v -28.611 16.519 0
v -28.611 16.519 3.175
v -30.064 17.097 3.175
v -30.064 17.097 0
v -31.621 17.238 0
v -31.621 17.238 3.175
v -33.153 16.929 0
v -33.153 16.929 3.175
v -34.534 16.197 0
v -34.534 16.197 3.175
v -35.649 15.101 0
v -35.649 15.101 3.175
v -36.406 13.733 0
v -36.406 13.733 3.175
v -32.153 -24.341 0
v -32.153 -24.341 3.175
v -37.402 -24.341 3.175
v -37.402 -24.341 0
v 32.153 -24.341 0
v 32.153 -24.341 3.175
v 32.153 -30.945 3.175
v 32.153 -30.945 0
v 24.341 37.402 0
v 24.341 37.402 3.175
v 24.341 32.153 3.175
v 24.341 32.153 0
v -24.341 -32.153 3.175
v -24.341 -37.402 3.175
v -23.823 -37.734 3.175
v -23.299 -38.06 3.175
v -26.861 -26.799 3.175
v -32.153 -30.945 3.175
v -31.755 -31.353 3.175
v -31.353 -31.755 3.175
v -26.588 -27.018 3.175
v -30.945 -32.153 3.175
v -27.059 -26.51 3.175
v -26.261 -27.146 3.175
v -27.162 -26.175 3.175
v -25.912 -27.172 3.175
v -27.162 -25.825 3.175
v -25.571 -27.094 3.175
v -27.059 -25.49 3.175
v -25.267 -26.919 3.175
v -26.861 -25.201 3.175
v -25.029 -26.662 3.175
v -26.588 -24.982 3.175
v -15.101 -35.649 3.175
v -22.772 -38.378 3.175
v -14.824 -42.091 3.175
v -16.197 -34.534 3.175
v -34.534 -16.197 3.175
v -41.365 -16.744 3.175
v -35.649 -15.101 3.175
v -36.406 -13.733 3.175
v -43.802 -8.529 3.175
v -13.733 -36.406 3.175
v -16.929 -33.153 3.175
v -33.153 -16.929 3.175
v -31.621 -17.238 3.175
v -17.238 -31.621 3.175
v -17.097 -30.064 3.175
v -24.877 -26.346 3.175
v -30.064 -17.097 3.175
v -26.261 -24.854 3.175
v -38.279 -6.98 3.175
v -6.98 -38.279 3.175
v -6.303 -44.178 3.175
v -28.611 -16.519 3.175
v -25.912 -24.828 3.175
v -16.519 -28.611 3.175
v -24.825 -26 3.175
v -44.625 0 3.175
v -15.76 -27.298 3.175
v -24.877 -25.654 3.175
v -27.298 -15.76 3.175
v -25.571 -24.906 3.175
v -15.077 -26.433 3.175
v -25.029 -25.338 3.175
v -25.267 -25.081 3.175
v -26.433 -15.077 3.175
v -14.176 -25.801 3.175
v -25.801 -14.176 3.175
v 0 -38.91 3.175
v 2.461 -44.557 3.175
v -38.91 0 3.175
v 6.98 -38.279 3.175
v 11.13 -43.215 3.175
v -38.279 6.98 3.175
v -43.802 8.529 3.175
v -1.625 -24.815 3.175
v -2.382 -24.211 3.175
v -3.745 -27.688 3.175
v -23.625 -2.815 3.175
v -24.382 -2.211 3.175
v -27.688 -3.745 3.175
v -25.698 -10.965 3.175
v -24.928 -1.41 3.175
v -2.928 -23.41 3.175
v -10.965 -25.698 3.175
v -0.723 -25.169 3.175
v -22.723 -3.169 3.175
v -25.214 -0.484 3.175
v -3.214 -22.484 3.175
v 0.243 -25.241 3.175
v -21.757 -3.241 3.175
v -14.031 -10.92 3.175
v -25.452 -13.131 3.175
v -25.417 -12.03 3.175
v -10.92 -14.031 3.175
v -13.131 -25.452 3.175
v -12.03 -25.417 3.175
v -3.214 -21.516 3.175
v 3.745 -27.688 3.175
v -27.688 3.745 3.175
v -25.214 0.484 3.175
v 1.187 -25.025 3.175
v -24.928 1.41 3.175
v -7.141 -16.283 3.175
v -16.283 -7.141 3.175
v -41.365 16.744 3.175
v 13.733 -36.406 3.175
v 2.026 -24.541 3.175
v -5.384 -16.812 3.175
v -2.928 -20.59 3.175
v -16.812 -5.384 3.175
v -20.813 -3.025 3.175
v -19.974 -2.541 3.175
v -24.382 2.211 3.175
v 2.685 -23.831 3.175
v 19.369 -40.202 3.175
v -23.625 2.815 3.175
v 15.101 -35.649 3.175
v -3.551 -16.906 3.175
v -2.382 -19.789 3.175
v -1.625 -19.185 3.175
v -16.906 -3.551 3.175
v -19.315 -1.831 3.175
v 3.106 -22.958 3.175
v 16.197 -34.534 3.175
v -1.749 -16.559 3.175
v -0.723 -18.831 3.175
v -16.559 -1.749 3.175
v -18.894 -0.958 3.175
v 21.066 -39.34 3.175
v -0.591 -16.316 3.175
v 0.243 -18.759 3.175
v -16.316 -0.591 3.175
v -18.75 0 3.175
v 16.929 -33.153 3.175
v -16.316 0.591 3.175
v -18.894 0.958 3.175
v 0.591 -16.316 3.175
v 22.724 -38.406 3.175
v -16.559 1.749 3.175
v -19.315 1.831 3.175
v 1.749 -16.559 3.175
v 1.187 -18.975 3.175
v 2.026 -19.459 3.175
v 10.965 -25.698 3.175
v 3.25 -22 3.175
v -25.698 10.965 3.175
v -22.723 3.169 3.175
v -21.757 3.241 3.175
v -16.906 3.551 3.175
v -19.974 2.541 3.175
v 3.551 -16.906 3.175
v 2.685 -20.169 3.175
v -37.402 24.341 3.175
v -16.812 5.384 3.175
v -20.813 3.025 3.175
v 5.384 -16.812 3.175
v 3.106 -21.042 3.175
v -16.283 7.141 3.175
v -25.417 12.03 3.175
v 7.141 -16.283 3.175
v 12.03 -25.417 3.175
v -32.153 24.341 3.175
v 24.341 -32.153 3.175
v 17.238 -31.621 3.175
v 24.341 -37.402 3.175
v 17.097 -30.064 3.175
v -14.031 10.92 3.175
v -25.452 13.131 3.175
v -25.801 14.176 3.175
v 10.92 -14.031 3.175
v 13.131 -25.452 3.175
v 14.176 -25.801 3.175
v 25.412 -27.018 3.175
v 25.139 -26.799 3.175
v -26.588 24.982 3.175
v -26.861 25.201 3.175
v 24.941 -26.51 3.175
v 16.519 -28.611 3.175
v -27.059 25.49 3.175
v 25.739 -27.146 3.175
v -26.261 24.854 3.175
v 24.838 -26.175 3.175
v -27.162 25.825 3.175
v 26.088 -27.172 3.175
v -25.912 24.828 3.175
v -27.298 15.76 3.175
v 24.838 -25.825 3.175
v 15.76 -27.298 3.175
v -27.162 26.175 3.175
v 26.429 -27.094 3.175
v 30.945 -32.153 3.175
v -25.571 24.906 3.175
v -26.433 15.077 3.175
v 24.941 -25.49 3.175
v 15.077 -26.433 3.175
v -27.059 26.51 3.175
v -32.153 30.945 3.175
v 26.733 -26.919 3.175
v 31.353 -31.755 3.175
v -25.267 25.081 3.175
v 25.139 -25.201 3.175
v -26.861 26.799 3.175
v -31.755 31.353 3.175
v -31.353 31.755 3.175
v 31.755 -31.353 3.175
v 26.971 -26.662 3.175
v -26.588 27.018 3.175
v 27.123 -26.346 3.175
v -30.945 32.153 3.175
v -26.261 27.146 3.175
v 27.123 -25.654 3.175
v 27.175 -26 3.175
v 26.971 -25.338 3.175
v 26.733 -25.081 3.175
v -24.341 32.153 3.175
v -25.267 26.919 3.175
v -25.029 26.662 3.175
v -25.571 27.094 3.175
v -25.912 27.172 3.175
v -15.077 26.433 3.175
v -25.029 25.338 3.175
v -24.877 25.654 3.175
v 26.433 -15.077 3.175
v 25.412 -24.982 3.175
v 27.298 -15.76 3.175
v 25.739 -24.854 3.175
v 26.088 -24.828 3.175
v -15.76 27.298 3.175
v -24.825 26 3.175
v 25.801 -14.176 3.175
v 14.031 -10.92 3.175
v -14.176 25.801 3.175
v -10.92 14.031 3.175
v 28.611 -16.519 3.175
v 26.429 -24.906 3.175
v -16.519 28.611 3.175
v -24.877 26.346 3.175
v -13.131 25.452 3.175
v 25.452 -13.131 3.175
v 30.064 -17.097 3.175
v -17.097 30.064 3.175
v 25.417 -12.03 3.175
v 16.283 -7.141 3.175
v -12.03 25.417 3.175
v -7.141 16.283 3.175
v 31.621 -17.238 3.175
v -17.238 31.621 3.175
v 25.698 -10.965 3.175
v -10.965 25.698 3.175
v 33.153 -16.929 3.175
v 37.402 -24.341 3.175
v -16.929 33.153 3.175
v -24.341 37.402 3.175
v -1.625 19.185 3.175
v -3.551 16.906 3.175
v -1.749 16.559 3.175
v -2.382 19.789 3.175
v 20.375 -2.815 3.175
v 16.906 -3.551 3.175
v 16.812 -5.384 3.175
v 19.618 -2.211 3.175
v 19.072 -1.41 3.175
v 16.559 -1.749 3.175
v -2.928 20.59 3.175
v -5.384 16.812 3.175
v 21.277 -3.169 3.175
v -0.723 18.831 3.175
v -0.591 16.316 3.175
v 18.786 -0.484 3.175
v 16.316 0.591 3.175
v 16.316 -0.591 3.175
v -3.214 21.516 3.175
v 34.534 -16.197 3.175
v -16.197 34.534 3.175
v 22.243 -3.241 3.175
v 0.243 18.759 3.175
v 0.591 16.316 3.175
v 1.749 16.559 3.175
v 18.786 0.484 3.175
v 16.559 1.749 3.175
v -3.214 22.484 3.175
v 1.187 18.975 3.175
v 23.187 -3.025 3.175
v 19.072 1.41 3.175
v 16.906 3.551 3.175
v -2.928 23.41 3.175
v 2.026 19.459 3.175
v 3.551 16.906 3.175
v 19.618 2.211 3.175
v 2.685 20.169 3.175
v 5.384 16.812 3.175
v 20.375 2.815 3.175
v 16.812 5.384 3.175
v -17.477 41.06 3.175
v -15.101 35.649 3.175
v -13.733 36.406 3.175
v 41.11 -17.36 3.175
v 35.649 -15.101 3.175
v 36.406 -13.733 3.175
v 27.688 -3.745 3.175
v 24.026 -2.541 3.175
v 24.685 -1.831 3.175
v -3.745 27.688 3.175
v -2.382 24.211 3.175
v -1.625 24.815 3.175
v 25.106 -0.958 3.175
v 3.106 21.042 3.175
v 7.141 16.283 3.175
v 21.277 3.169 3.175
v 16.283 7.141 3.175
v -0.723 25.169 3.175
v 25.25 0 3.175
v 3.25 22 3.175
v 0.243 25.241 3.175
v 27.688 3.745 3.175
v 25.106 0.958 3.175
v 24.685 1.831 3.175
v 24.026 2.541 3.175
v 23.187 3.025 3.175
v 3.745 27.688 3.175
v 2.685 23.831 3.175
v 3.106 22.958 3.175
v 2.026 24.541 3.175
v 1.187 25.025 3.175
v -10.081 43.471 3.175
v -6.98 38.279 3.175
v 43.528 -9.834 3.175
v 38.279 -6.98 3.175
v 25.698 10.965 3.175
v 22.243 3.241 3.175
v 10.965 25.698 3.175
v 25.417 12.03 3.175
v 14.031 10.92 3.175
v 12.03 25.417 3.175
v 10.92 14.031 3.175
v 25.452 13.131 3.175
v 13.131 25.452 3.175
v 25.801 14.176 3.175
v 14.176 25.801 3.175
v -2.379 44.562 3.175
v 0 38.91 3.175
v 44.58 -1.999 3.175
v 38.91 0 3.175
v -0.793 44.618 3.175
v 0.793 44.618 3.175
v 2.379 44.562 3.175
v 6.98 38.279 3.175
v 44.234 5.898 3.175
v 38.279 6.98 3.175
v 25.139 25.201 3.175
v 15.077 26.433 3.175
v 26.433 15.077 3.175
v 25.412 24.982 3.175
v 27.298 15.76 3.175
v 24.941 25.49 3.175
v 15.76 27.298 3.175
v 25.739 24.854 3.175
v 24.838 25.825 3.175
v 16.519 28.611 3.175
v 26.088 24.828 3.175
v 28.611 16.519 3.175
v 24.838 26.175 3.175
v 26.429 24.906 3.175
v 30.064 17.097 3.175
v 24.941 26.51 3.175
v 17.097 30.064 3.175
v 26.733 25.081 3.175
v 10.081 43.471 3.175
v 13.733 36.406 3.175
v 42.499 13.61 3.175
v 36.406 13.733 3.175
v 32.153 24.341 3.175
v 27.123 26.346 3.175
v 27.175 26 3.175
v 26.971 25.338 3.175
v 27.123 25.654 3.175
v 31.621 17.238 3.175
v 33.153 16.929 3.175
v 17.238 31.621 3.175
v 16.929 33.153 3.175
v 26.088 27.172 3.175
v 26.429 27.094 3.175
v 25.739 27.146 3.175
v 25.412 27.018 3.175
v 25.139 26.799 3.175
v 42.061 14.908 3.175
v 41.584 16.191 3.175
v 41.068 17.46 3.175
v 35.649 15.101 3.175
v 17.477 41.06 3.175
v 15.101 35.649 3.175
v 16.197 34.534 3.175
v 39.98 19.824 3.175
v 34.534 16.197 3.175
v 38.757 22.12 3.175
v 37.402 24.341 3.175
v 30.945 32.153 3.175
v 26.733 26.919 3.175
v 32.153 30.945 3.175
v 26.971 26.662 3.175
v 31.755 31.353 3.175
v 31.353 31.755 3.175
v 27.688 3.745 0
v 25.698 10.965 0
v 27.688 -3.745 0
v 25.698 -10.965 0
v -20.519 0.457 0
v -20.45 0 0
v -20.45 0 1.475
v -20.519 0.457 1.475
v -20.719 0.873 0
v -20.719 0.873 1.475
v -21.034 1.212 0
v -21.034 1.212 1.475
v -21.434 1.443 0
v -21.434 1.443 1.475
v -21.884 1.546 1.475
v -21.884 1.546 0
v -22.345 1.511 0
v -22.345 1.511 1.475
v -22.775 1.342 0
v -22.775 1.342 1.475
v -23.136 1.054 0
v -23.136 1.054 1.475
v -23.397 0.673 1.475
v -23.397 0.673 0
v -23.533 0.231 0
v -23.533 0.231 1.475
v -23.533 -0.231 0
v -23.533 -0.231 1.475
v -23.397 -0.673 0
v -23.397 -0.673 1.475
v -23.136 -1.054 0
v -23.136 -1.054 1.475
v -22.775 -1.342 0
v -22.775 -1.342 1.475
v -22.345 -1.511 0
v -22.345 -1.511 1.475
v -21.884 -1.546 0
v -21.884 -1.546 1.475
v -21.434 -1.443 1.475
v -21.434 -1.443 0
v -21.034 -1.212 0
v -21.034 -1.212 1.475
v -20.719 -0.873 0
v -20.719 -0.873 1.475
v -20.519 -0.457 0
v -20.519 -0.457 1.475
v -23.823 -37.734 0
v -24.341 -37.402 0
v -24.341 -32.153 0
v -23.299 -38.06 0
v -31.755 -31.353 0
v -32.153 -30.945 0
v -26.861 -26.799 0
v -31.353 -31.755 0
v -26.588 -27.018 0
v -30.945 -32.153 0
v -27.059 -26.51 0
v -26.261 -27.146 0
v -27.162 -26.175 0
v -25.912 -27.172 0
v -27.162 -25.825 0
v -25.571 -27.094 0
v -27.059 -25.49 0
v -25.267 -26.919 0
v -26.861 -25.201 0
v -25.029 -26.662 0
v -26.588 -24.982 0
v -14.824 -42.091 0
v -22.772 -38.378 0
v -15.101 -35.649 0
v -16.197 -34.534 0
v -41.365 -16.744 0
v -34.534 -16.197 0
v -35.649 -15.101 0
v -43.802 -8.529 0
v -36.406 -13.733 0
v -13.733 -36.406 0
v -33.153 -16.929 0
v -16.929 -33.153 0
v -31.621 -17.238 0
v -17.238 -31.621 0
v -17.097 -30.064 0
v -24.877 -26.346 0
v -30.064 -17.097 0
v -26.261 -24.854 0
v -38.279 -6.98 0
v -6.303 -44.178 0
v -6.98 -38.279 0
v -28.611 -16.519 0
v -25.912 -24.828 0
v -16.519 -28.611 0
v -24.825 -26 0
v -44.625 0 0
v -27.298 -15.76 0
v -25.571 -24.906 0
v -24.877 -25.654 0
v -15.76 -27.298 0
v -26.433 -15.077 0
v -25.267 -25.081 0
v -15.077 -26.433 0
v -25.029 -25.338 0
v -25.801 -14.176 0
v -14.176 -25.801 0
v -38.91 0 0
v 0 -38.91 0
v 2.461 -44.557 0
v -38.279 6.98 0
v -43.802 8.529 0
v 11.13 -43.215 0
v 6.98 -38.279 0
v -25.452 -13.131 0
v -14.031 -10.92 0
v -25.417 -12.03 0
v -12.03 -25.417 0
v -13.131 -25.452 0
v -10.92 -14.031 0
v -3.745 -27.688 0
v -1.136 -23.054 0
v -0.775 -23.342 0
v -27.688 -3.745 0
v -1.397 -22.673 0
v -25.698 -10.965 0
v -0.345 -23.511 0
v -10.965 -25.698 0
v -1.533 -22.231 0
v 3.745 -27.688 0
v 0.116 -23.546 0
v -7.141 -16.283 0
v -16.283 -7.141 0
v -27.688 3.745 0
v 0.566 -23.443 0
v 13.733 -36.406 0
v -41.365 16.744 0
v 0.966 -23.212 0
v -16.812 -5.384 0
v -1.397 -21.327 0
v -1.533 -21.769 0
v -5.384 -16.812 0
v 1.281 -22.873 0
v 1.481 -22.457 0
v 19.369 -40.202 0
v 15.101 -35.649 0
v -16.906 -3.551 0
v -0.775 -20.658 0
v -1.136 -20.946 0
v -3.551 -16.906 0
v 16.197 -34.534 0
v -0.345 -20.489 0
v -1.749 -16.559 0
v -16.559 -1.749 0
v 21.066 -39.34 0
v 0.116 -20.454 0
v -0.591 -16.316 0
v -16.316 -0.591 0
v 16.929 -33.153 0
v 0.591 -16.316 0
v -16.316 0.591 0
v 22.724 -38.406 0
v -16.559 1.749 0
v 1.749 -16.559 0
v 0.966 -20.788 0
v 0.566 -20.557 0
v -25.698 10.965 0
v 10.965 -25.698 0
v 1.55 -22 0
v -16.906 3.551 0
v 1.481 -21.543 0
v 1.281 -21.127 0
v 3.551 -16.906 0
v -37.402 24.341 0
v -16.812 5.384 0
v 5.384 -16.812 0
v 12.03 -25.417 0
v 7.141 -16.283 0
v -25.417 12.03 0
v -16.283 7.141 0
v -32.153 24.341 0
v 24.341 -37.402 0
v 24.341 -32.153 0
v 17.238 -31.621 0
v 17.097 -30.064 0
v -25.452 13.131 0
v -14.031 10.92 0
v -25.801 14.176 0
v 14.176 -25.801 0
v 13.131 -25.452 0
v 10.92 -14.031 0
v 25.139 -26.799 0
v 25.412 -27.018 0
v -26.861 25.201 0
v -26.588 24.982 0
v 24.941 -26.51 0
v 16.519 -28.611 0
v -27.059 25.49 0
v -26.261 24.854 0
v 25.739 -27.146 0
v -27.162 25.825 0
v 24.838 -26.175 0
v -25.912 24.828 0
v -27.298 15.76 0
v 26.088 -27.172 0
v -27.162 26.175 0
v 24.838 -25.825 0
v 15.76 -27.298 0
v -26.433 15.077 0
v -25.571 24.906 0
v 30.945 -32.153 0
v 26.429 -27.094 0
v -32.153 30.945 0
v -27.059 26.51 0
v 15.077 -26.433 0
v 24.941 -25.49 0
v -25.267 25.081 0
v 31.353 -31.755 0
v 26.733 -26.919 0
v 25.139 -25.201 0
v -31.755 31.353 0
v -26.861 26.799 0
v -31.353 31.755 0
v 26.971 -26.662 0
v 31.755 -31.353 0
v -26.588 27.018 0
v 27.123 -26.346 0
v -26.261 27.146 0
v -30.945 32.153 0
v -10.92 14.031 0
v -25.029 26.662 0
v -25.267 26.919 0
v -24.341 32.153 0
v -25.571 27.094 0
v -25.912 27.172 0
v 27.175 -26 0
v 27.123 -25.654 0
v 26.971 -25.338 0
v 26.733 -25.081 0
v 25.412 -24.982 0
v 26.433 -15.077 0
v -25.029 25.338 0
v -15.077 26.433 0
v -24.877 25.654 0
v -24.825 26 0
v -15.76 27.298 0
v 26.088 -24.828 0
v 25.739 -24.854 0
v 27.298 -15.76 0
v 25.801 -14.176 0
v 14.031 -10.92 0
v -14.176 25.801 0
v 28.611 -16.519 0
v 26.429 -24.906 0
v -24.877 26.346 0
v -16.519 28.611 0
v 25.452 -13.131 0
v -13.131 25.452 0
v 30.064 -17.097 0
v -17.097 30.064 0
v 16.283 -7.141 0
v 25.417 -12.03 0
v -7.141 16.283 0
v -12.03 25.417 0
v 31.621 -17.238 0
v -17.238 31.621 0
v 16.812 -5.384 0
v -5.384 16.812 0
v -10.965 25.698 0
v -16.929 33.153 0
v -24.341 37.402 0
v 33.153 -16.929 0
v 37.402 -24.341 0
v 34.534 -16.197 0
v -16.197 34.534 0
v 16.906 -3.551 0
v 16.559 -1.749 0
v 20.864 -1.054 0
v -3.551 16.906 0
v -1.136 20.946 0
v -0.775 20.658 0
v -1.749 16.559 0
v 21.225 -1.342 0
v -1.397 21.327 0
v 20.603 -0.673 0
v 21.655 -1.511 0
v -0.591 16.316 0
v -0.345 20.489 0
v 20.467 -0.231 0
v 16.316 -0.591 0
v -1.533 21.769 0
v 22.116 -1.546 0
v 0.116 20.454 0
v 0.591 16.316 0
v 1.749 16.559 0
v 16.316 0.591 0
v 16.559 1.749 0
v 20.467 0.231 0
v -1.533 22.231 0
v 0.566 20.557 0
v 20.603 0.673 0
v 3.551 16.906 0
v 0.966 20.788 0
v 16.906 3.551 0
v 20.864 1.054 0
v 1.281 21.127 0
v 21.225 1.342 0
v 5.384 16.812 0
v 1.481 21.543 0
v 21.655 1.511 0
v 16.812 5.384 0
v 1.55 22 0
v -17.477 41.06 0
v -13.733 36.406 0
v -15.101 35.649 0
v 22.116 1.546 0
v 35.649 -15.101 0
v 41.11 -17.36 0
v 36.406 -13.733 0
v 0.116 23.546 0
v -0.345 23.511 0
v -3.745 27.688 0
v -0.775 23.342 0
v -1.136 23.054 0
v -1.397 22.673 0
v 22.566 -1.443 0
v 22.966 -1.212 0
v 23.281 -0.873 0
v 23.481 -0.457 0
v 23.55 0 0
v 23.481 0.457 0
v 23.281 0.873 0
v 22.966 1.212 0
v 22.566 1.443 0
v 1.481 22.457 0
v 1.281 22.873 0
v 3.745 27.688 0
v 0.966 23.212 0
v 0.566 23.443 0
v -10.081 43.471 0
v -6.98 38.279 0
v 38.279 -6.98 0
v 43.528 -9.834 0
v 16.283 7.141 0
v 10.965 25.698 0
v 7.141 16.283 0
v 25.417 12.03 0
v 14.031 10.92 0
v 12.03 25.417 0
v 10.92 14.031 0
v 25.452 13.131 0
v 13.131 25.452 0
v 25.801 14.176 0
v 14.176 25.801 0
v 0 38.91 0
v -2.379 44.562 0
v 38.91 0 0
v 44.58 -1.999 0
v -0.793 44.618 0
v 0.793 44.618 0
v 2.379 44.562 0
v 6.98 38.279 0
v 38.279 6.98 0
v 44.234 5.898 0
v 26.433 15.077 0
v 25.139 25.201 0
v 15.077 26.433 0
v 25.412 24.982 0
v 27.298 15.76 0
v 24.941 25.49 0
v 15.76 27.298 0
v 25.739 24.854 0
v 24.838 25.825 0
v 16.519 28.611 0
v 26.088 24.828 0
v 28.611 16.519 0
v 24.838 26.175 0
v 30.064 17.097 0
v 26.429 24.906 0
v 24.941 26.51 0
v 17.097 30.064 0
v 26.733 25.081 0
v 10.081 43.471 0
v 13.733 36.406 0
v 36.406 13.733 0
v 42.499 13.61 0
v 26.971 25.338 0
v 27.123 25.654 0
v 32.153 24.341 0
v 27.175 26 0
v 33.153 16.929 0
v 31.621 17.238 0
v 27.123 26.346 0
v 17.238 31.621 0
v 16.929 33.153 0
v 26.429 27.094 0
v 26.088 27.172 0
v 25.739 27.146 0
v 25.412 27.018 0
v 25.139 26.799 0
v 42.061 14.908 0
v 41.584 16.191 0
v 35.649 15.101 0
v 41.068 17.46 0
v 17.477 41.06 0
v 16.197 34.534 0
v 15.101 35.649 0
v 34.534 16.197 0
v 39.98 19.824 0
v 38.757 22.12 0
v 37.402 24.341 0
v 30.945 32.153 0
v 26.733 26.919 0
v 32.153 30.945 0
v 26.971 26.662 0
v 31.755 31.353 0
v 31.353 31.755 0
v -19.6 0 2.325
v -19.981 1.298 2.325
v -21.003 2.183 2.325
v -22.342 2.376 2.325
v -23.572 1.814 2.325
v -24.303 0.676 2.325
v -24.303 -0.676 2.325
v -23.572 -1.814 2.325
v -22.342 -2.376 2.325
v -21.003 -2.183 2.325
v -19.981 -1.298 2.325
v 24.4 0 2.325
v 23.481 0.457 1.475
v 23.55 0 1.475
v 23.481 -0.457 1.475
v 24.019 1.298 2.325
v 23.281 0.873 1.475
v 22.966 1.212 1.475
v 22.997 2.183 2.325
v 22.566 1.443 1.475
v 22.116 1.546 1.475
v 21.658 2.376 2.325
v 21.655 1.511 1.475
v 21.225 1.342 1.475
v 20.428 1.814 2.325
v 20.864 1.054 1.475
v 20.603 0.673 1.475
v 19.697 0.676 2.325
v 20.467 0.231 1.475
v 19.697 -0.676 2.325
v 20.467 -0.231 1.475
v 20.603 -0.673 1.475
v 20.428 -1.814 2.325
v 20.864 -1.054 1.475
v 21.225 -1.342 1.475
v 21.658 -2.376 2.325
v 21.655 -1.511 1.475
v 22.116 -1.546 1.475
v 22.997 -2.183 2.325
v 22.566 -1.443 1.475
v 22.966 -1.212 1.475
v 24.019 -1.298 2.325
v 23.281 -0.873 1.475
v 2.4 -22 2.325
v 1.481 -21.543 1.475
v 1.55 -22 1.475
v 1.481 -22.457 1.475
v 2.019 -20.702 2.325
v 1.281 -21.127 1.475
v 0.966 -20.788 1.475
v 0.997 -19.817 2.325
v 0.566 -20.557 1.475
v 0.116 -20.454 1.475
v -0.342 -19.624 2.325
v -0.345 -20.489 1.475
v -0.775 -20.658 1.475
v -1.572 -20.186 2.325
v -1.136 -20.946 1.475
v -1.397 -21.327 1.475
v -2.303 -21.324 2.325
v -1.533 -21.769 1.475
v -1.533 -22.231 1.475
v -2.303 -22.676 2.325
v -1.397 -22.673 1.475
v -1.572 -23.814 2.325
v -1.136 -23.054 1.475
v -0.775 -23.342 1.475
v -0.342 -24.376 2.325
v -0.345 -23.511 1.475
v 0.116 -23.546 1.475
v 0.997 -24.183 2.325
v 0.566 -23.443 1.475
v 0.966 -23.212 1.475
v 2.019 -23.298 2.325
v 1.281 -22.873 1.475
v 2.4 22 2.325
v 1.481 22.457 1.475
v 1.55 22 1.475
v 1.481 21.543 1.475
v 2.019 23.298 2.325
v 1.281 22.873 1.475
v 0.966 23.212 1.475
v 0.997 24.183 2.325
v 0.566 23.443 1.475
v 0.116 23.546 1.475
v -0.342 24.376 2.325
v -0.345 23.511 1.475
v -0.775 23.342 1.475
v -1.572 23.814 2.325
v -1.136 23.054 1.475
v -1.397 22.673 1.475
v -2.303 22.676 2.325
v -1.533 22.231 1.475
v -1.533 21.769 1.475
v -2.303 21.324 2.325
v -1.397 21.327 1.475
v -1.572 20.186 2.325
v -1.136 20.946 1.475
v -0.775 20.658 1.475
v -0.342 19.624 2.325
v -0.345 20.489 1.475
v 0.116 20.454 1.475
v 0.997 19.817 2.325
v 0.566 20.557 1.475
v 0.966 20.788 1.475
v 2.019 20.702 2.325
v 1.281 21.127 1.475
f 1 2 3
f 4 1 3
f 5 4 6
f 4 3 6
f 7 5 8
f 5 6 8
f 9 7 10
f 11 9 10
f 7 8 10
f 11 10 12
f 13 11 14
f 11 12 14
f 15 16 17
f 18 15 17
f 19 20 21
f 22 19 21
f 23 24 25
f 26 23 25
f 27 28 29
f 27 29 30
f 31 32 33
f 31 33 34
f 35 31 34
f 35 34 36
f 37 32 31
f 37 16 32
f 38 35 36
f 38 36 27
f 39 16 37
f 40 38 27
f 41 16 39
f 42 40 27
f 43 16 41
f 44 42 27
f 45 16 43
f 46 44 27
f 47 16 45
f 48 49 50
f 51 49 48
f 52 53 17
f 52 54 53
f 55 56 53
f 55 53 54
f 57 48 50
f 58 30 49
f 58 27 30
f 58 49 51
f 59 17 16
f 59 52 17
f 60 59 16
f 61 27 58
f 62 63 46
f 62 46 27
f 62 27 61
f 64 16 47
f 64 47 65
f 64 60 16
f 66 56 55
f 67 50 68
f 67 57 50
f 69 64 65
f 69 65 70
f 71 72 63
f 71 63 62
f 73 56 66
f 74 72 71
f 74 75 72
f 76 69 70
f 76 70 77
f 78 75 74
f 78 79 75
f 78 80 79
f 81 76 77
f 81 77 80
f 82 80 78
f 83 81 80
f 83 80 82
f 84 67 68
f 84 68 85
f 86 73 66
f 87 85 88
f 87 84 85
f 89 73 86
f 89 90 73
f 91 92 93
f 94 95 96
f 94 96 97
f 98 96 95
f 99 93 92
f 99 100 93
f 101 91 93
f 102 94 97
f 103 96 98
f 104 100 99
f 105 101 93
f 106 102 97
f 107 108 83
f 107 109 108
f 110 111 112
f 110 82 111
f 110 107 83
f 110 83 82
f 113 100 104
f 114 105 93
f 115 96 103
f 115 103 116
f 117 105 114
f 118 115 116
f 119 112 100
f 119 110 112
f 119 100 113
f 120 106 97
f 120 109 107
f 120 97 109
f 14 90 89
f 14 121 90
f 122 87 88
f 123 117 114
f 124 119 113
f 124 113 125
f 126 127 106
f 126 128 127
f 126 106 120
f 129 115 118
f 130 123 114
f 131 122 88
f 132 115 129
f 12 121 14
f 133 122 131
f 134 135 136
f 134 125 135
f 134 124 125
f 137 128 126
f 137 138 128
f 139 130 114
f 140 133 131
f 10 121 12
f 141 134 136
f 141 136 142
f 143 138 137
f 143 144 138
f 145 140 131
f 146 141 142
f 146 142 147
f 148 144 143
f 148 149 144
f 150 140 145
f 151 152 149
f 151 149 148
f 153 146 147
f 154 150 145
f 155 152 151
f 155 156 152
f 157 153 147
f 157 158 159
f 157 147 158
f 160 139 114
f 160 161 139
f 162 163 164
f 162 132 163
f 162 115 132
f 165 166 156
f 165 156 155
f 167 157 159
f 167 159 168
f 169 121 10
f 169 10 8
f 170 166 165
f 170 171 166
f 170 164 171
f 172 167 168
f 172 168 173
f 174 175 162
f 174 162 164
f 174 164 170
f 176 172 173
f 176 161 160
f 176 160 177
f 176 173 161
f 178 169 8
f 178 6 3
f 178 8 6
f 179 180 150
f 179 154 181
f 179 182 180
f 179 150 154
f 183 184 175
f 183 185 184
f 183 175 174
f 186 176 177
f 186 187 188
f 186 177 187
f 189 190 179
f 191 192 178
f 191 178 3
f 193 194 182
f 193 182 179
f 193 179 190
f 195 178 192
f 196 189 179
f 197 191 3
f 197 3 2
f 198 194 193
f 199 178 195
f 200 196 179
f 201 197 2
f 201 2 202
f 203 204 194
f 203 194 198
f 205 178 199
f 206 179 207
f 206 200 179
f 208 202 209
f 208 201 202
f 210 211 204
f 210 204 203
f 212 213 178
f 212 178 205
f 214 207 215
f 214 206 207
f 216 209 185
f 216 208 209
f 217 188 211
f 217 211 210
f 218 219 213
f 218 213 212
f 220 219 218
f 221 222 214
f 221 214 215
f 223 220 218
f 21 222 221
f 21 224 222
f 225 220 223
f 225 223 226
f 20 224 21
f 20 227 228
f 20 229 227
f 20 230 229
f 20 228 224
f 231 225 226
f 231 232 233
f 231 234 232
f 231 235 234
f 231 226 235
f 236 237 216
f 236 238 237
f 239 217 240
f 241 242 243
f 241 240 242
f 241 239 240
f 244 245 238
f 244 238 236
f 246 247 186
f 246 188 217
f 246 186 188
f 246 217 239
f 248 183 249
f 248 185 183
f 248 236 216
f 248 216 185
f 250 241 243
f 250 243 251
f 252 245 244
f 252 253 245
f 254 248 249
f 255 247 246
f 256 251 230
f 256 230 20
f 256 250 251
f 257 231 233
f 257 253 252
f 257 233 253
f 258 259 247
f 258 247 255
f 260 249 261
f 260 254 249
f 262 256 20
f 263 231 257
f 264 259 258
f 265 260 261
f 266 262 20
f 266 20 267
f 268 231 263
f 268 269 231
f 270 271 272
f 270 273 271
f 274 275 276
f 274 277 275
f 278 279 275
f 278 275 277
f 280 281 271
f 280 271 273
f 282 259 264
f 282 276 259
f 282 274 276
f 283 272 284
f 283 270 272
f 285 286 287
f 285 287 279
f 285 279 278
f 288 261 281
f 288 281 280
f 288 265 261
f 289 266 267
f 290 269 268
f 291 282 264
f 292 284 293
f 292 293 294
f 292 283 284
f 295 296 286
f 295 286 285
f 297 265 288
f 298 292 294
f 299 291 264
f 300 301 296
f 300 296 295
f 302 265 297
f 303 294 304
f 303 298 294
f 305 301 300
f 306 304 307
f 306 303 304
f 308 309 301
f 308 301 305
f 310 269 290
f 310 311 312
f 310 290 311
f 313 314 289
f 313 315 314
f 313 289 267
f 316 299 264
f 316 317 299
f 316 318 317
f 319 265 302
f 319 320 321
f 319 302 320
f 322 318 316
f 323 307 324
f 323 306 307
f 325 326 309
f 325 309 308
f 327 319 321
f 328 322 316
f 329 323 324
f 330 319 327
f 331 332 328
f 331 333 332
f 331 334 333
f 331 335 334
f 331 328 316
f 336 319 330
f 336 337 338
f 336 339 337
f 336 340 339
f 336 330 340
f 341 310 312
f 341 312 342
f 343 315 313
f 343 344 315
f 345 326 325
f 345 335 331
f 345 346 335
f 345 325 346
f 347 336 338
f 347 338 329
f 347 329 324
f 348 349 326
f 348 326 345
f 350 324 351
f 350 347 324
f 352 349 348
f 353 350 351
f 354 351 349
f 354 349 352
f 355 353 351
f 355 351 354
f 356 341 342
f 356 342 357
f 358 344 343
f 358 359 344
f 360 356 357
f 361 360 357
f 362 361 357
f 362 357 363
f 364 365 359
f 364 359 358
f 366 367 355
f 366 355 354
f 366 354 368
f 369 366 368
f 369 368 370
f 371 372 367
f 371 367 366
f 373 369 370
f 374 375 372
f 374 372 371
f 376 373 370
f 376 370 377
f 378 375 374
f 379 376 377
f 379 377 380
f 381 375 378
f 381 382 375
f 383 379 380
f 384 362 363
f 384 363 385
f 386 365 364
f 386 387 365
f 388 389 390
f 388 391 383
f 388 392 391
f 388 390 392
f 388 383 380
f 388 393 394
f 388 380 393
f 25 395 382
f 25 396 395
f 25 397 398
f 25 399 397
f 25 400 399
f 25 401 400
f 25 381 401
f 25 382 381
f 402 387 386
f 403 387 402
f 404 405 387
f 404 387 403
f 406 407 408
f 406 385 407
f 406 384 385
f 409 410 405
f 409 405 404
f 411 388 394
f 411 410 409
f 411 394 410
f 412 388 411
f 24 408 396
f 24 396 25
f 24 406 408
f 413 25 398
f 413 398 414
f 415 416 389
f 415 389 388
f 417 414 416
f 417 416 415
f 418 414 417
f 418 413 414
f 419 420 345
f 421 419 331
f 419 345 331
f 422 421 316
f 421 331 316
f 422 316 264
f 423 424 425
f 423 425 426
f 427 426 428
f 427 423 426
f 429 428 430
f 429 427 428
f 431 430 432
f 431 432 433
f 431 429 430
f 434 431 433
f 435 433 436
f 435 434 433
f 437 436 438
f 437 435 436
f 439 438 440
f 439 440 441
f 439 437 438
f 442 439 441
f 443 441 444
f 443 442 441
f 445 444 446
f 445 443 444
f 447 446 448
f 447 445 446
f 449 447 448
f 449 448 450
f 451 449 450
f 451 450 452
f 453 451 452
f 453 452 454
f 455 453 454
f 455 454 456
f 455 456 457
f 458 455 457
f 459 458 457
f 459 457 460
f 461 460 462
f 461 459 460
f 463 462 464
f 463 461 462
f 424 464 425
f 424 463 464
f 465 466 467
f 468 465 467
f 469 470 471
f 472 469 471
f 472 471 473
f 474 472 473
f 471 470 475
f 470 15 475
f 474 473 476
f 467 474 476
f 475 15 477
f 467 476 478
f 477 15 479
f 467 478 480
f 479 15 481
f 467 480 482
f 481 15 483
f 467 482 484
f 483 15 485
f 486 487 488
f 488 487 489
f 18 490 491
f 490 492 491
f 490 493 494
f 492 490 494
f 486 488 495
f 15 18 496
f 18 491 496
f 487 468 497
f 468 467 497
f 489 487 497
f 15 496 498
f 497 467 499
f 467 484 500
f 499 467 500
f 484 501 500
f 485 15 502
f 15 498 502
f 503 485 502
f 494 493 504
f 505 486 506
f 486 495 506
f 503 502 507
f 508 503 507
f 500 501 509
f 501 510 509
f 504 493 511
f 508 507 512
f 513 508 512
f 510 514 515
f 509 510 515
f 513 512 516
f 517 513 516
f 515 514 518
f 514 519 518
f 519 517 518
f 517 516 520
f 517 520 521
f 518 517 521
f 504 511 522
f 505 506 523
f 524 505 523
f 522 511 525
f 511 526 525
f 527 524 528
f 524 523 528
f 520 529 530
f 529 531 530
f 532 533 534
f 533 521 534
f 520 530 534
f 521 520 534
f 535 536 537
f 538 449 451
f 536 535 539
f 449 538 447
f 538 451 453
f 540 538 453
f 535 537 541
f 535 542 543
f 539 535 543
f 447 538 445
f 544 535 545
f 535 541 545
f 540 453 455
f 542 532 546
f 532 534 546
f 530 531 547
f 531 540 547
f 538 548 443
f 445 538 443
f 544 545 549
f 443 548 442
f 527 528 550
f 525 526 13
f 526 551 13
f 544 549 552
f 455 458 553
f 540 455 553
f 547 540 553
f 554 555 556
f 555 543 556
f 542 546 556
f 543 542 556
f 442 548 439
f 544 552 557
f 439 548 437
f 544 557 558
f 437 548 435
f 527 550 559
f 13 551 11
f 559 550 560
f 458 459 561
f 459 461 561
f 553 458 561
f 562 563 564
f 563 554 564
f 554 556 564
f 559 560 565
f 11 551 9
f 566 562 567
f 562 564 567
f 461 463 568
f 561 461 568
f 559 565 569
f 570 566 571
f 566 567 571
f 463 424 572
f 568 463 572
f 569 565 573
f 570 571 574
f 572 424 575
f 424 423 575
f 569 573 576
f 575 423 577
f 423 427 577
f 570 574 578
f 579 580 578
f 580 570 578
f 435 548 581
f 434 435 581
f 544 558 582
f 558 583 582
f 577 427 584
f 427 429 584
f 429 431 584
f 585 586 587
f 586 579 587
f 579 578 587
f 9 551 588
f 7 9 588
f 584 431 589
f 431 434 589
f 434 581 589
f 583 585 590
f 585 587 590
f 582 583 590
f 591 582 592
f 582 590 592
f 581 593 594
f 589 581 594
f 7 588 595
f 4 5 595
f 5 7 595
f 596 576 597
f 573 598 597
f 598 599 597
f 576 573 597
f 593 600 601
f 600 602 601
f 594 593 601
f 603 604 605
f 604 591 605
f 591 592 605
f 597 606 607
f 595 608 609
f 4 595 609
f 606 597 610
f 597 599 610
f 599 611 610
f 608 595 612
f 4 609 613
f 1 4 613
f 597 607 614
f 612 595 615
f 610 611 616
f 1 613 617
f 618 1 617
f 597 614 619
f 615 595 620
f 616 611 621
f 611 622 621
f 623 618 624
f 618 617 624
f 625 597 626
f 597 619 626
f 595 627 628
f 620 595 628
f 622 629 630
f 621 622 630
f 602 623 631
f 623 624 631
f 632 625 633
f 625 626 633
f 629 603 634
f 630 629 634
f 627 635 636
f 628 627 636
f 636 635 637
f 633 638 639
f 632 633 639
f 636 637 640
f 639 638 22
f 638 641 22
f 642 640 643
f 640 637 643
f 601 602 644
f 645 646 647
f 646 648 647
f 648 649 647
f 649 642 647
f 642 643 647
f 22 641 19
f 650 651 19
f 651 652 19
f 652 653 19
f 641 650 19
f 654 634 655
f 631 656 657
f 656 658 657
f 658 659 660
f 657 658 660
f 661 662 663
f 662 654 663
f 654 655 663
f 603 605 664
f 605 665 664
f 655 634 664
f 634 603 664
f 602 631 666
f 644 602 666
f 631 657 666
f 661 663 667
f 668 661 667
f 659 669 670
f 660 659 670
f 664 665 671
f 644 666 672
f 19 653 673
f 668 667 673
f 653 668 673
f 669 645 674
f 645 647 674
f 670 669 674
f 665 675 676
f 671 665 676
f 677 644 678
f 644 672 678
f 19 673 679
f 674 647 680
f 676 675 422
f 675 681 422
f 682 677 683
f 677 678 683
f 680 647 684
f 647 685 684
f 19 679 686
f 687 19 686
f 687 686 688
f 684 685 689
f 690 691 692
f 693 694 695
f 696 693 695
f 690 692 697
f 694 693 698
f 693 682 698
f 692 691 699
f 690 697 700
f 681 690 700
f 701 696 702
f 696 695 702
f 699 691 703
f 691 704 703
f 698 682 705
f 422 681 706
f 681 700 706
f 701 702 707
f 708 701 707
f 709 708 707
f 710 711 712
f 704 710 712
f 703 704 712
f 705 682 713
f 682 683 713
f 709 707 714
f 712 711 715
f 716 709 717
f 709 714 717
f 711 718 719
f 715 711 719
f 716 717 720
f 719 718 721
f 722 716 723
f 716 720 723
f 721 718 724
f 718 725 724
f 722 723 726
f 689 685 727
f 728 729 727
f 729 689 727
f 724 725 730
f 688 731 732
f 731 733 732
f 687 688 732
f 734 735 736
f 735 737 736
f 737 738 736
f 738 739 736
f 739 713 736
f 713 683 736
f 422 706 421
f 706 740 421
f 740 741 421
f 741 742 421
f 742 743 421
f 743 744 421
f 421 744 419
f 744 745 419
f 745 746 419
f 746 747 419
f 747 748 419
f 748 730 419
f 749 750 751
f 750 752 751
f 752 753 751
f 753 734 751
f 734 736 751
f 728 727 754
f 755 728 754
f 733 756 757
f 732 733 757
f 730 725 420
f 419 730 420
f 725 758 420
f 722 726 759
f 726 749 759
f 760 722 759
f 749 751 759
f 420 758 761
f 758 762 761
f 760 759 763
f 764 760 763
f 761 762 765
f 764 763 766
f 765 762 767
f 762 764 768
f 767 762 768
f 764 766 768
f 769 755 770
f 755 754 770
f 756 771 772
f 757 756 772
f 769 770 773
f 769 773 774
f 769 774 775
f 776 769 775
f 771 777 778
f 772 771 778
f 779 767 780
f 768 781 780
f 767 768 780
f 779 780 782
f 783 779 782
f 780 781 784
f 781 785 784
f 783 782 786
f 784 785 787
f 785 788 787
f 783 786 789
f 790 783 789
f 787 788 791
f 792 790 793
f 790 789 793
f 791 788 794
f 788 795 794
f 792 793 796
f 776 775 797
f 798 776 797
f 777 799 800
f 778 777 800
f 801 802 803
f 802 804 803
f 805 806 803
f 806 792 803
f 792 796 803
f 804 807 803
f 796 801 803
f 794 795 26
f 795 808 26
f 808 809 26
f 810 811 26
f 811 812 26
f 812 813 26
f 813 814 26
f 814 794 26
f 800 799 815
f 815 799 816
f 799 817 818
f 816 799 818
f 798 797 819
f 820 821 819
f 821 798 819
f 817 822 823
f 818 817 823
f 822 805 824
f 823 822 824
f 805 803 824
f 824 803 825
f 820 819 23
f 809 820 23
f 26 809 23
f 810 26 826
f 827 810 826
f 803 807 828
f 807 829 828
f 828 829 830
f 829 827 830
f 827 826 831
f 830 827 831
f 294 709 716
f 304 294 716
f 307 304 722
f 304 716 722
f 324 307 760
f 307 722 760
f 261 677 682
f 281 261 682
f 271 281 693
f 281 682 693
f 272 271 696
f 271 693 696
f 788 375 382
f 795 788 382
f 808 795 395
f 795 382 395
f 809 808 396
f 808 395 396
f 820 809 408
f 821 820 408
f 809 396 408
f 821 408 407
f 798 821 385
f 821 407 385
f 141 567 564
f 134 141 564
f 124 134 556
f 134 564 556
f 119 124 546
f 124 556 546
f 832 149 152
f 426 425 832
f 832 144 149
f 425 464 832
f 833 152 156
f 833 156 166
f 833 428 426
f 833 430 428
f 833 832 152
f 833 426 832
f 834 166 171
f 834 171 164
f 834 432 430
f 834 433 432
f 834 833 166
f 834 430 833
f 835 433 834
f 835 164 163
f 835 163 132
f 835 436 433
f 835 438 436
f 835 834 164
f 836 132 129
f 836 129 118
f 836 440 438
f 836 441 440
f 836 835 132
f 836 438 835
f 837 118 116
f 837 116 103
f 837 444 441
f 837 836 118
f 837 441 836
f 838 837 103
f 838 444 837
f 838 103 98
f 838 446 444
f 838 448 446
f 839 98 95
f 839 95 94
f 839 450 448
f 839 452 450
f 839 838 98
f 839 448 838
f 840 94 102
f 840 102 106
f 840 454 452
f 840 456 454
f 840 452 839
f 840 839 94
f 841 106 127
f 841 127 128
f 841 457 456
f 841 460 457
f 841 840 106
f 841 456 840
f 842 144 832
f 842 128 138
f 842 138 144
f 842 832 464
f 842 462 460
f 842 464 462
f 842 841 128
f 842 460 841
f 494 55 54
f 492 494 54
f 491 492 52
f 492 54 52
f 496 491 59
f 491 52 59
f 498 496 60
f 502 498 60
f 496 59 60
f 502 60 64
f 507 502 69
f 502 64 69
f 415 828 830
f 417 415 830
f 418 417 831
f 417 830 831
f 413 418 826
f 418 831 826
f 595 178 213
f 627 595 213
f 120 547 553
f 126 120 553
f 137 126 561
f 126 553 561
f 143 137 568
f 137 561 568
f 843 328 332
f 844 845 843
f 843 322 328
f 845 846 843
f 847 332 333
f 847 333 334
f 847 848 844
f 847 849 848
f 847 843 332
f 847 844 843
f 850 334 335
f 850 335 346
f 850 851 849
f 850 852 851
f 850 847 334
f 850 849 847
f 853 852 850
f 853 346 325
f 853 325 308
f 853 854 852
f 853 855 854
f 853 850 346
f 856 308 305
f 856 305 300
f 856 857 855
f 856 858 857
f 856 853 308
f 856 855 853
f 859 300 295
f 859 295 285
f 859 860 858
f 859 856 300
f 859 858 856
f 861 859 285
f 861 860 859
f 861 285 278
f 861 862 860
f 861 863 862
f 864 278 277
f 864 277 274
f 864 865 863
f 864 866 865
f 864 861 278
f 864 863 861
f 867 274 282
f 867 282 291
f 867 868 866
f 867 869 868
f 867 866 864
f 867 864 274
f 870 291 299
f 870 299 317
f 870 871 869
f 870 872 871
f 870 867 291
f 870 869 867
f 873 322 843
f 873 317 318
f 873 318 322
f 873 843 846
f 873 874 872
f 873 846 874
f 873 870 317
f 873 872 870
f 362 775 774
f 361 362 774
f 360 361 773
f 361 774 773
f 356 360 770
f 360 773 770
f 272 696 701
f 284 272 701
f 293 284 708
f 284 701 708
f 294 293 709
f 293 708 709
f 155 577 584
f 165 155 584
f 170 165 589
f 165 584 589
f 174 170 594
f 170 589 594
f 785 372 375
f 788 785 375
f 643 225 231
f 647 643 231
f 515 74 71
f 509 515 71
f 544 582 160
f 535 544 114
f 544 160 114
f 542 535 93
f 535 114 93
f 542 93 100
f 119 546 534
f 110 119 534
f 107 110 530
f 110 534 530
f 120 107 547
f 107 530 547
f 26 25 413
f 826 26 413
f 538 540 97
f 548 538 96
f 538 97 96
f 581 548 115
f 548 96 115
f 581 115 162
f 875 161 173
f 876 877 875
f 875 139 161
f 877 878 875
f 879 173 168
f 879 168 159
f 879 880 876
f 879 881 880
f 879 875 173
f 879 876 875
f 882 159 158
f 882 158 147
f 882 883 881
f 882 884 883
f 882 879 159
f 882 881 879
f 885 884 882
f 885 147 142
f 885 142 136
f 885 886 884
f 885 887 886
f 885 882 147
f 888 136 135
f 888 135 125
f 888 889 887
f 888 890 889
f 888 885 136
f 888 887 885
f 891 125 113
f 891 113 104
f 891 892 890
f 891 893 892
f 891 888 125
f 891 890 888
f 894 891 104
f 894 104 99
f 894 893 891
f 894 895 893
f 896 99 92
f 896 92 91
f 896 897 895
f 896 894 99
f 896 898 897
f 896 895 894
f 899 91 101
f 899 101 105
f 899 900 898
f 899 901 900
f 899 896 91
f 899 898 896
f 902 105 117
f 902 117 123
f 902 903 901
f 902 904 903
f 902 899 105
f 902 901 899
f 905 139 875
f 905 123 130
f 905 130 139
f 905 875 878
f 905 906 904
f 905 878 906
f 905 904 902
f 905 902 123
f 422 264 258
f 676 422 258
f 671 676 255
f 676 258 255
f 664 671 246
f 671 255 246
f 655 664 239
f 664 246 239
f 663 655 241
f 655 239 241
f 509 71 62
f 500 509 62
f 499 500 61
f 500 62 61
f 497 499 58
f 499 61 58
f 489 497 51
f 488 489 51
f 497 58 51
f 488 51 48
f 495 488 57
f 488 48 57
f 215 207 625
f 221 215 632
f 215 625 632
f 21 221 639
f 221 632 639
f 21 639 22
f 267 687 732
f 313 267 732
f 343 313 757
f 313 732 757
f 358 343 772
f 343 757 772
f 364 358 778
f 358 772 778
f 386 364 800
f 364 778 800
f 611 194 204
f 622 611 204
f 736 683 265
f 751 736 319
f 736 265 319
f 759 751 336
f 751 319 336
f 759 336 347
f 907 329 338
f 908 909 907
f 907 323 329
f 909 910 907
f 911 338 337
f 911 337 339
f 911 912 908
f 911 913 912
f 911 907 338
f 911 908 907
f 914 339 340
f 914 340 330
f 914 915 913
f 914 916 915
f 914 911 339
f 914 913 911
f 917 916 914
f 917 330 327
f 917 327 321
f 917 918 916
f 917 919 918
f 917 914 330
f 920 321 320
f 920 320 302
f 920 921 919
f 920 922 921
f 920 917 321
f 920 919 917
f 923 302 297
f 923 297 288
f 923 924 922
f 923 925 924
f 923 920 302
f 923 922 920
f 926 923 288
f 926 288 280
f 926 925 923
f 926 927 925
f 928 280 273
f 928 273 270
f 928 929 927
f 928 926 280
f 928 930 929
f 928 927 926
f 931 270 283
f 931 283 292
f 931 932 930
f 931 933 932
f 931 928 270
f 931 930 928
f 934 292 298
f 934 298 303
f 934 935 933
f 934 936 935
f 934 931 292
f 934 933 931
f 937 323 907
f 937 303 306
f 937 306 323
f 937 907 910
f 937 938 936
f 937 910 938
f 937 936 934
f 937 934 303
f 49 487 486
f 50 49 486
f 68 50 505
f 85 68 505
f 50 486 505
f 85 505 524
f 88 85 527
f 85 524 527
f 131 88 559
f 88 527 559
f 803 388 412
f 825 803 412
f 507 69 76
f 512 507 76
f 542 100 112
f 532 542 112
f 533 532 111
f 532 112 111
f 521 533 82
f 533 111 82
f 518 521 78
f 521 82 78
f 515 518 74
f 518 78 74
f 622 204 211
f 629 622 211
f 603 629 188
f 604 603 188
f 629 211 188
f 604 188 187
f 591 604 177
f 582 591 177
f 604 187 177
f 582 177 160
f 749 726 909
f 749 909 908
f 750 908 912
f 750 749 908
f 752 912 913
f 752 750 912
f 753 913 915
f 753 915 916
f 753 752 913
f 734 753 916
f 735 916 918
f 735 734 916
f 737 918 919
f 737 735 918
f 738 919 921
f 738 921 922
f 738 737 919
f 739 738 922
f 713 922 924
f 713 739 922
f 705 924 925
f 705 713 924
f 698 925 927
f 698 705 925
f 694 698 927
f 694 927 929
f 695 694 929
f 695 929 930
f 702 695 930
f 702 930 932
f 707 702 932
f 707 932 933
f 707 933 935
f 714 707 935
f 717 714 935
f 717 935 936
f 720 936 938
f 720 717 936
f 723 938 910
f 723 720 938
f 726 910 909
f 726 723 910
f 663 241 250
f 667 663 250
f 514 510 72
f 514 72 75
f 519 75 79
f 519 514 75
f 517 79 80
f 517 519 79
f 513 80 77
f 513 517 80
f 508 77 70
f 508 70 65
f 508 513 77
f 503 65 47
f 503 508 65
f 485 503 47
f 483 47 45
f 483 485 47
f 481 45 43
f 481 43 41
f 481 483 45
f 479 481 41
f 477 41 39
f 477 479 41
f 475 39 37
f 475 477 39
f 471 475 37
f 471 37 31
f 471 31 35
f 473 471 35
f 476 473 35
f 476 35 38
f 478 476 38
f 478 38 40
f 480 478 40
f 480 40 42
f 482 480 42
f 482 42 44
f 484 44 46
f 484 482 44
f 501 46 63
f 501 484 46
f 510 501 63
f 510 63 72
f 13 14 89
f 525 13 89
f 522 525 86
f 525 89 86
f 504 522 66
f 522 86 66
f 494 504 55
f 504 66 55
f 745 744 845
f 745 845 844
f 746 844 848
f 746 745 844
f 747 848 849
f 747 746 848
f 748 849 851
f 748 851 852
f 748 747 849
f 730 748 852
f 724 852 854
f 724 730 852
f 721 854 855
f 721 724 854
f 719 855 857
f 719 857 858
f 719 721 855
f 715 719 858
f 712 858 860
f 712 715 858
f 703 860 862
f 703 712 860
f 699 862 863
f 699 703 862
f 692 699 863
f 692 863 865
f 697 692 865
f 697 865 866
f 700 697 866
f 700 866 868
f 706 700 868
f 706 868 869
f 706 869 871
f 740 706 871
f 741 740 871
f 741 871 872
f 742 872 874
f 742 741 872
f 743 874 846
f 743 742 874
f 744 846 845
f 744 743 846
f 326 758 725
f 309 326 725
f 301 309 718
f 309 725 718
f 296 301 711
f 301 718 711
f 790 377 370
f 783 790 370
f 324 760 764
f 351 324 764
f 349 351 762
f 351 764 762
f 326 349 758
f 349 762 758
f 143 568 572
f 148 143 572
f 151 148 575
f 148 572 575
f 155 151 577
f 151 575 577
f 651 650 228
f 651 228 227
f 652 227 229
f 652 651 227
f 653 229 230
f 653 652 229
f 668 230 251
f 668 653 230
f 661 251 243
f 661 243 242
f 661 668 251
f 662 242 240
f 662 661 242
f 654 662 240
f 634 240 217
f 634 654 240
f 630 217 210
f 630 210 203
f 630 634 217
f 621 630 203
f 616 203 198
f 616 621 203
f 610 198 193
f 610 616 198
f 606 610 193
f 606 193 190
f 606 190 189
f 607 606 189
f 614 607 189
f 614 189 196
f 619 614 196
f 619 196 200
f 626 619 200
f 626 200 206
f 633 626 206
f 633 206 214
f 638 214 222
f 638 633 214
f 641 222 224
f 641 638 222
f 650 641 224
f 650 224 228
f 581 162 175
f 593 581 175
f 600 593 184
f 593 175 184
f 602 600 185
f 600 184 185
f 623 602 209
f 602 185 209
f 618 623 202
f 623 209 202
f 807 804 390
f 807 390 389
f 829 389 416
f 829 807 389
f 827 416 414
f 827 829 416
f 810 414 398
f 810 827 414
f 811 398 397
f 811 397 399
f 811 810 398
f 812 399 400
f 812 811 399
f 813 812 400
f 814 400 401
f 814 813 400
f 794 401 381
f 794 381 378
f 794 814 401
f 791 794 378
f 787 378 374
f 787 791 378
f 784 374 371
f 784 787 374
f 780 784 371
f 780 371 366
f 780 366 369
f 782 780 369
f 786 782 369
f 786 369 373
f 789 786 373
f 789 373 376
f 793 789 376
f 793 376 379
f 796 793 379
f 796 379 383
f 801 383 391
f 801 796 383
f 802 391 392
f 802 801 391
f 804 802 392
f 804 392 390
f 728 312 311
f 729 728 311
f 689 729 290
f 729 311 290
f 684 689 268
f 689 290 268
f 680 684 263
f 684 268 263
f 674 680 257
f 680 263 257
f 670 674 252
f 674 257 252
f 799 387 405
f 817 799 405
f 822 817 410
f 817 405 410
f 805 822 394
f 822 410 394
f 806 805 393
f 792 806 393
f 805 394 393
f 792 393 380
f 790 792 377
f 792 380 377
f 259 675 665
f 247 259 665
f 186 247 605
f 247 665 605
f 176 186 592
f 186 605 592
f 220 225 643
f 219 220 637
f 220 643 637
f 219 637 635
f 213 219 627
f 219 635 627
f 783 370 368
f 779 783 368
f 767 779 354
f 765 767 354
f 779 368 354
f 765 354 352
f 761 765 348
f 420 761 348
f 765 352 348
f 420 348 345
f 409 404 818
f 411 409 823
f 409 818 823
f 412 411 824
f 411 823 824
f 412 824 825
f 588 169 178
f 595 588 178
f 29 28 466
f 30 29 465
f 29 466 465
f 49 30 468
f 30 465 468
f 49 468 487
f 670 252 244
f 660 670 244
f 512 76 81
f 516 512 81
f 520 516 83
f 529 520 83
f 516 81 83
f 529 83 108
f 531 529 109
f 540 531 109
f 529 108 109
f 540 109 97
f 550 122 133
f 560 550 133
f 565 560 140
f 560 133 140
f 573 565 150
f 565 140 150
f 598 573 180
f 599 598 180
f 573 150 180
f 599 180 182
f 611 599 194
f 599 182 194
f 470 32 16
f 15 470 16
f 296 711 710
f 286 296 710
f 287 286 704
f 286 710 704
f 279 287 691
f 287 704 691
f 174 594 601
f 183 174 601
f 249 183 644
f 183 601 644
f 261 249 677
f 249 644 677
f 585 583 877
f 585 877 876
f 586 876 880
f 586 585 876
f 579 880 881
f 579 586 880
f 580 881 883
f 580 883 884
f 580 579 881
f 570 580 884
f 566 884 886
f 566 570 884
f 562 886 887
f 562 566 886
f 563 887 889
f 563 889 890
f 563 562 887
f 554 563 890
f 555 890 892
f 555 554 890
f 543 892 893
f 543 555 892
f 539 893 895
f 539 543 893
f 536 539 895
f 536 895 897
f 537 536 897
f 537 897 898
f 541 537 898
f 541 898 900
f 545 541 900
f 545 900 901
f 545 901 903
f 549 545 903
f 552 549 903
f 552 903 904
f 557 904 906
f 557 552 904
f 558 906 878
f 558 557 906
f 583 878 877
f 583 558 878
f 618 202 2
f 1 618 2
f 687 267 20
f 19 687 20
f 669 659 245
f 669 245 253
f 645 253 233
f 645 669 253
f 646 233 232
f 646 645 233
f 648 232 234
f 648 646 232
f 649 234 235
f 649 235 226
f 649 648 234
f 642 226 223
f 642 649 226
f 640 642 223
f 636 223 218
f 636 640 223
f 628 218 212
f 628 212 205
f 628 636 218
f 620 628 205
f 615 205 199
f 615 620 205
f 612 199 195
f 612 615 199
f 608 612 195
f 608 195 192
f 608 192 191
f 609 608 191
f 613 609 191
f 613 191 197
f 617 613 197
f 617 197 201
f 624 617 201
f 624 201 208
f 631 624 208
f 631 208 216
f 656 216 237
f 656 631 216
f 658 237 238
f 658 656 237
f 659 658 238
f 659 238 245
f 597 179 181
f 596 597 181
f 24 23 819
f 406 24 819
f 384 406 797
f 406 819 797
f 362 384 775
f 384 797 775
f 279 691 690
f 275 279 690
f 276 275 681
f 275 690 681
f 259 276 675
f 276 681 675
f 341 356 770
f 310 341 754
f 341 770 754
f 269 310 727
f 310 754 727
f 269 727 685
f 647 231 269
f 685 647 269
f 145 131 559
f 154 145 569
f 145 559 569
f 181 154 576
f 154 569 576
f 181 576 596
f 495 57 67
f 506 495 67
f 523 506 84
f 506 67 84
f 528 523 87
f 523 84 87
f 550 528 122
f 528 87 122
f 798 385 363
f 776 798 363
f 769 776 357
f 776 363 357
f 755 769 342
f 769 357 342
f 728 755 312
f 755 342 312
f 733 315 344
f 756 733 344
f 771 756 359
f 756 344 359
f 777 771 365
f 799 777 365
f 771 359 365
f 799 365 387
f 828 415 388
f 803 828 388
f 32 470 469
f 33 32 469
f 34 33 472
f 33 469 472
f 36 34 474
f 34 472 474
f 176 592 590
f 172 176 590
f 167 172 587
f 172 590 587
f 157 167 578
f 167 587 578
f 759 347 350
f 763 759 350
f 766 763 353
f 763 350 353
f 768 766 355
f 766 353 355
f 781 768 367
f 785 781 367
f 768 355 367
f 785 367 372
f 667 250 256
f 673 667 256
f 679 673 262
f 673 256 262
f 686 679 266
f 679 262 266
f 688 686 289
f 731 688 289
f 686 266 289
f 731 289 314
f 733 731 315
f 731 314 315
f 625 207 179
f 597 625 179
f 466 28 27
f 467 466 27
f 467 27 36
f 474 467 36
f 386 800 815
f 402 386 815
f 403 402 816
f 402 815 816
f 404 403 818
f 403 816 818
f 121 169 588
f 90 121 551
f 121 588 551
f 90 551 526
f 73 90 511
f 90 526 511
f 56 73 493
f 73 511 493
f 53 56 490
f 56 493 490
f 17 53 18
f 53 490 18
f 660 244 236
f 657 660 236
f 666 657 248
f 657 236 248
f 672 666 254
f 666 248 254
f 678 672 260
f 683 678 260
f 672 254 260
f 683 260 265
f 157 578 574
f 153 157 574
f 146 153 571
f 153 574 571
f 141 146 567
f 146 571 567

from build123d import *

# Parameters (mm, degrees)
SKETCH1_R           = 1.175
SKETCH1_R_2         = 1.55
BOSS_EXTRUDE1_DEPTH = 3.175
CUT_EXTRUDE2_DEPTH  = 64.189096172
CUT_EXTRUDE1_DEPTH  = 64.189096172
CIRPATTERN1_COUNT   = 4
CHAMFER1_SIZE       = 1.7


with BuildPart() as part:
    # Sketch1 → Boss-Extrude1 (new body)
    with BuildSketch(Plane.XY):
        with BuildLine():
            ThreePointArc((-28.274738921, -34.524335822), (-25.595848472, -36.554659976), (-22.771733351, -38.377581805))
            ThreePointArc((-22.771733351, -38.377581805), (-1.930585195, -44.583219554), (19.368987874, -40.202399602))
            ThreePointArc((19.368987874, -40.202399602), (22.3125, -38.646383644), (25.131805412, -36.875235345))
            ThreePointArc((25.131805412, -36.875235345), (42.197997698, -14.516184597), (42.498870951, 13.610165056))
            ThreePointArc((42.498870951, 13.610165056), (41.827558264, 15.551398481), (41.067627867, 17.459684027))
            ThreePointArc((41.067627867, 17.459684027), (25.603337609, 36.549414883), (2.379040875, 44.561539353))
            ThreePointArc((2.379040875, 44.561539353), (0, 44.625), (-2.379040875, 44.561539353))
            ThreePointArc((-2.379040875, 44.561539353), (-42.409403049, 13.886437917), (-28.274738921, -34.524335822))
        make_face()
        with Locations((-26, -26)):
            Circle(SKETCH1_R, mode=Mode.SUBTRACT)
        with Locations((0, -22)):
            Circle(SKETCH1_R_2, mode=Mode.SUBTRACT)
        with Locations((-22, 0)):
            Circle(SKETCH1_R_2, mode=Mode.SUBTRACT)
        with BuildLine():
            ThreePointArc((-7.14068763, 16.283088778), (-4.469980501, 16.914656425), (-1.748739828, 16.559123782))
            ThreePointArc((-1.748739828, 16.559123782), (0, 16.285), (1.748739828, 16.559123782))
            ThreePointArc((1.748739828, 16.559123782), (4.469980501, 16.914656425), (7.14068763, 16.283088778))
            ThreePointArc((7.14068763, 16.283088778), (12.572358569, 12.572358569), (16.283088778, 7.14068763))
            ThreePointArc((16.283088778, 7.14068763), (16.914656425, 4.469980501), (16.559123782, 1.748739828))
            ThreePointArc((16.559123782, 1.748739828), (16.285, 0), (16.559123782, -1.748739828))
            ThreePointArc((16.559123782, -1.748739828), (16.914656425, -4.469980501), (16.283088778, -7.14068763))
            ThreePointArc((16.283088778, -7.14068763), (12.572358569, -12.572358569), (7.14068763, -16.283088778))
            ThreePointArc((7.14068763, -16.283088778), (4.469980501, -16.914656425), (1.748739828, -16.559123782))
            ThreePointArc((1.748739828, -16.559123782), (0, -16.285), (-1.748739828, -16.559123782))
            ThreePointArc((-1.748739828, -16.559123782), (-4.469980501, -16.914656425), (-7.14068763, -16.283088778))
            ThreePointArc((-7.14068763, -16.283088778), (-12.572358569, -12.572358569), (-16.283088778, -7.14068763))
            ThreePointArc((-16.283088778, -7.14068763), (-16.914656425, -4.469980501), (-16.559123782, -1.748739828))
            ThreePointArc((-16.559123782, -1.748739828), (-16.285, 0), (-16.559123782, 1.748739828))
            ThreePointArc((-16.559123782, 1.748739828), (-16.914656425, 4.469980501), (-16.283088778, 7.14068763))
            ThreePointArc((-16.283088778, 7.14068763), (-12.572358569, 12.572358569), (-7.14068763, 16.283088778))
        make_face(mode=Mode.SUBTRACT)
        with Locations((26, -26)):
            Circle(SKETCH1_R, mode=Mode.SUBTRACT)
        with Locations((22, 0)):
            Circle(SKETCH1_R_2, mode=Mode.SUBTRACT)
        with Locations((0, 22)):
            Circle(SKETCH1_R_2, mode=Mode.SUBTRACT)
        with Locations((-26, 26)):
            Circle(SKETCH1_R, mode=Mode.SUBTRACT)
        with Locations((26, 26)):
            Circle(SKETCH1_R, mode=Mode.SUBTRACT)
    extrude(amount=BOSS_EXTRUDE1_DEPTH)

    # Sketch3 → Cut-Extrude2 (cut, through all)
    with BuildSketch(Plane.XY.offset(3.175)):
        Polygon((-36.863511092, 36.863511092), (-54.798863679, 36.863511092), (-54.798863679, 24.341335398), (-32.152970188, 24.341335398), (-32.152970188, 32.152970188), (-36.863511092, 32.152970188), align=None)
        Polygon((-36.863511092, 54.798863679), (-36.863511092, 36.863511092), (-32.152970188, 36.863511092), (-32.152970188, 32.152970188), (-24.341335398, 32.152970188), (-24.341335398, 54.798863679), align=None)
        Polygon((-32.152970188, -32.152970188), (-32.152970188, -24.341335398), (-54.798863679, -24.341335398), (-54.798863679, -36.863511092), (-36.863511092, -36.863511092), (-36.863511092, -54.798863679), (-24.341335398, -54.798863679), (-24.341335398, -32.152970188), align=None)
        Polygon((24.341335398, 32.152970188), (32.152970188, 32.152970188), (32.152970188, 36.863511092), (36.863511092, 36.863511092), (36.863511092, 54.798863679), (24.341335398, 54.798863679), align=None)
        Polygon((36.863511092, 32.152970188), (32.152970188, 32.152970188), (32.152970188, 24.341335398), (54.798863679, 24.341335398), (54.798863679, 36.863511092), (36.863511092, 36.863511092), align=None)
        Polygon((32.152970188, -32.152970188), (24.341335398, -32.152970188), (24.341335398, -54.798863679), (36.863511092, -54.798863679), (36.863511092, -36.863511092), (32.152970188, -36.863511092), align=None)
        Polygon((32.152970188, -32.152970188), (36.863511092, -32.152970188), (36.863511092, -36.863511092), (54.798863679, -36.863511092), (54.798863679, -24.341335398), (32.152970188, -24.341335398), align=None)
    extrude(amount=-CUT_EXTRUDE2_DEPTH, mode=Mode.SUBTRACT)

    # Sketch2 → Cut-Extrude1 (cut, through all)
    with BuildSketch(Plane.XY.offset(3.175)):
        with BuildLine():
            Line((-16.518713095, 28.611250357), (-15.76028553, 27.29761528))
            ThreePointArc((-15.76028553, 27.29761528), (-13.666256903, 25.588365448), (-10.965441293, 25.698301447))
            ThreePointArc((-10.965441293, 25.698301447), (0, 27.94), (10.965441293, 25.698301447))
            ThreePointArc((10.965441293, 25.698301447), (13.666256903, 25.588365448), (15.76028553, 27.29761528))
            Line((15.76028553, 27.29761528), (16.518713095, 28.611250357))
            ThreePointArc((16.518713095, 28.611250357), (16.929410685, 33.153177065), (13.732973771, 36.405954615))
            ThreePointArc((13.732973771, 36.405954615), (0, 38.91), (-13.732973771, 36.405954615))
            ThreePointArc((-13.732973771, 36.405954615), (-16.929410685, 33.153177065), (-16.518713095, 28.611250357))
        make_face()
    cut_extrude1 = extrude(amount=-CUT_EXTRUDE1_DEPTH, mode=Mode.SUBTRACT)

    # CirPattern1: Cut-Extrude1 ×4 about axis
    cirpattern1_axis = Axis((0, 0, 3.175), (0, 0, -1))
    for i in range(1, CIRPATTERN1_COUNT):
        add(cut_extrude1.rotate(cirpattern1_axis, i * 360 / CIRPATTERN1_COUNT), mode=Mode.SUBTRACT)

    # Chamfer1
    chamfer1_edges = [part.edges().sort_by_distance(p)[0] for p in [
        (-23.55, 0, 3.175),
        (-1.55, -22, 3.175),
        (20.45, 0, 3.175),
        (-1.55, 22, 3.175),
    ]]
    chamfer(chamfer1_edges, length=CHAMFER1_SIZE)


solid = part.part
